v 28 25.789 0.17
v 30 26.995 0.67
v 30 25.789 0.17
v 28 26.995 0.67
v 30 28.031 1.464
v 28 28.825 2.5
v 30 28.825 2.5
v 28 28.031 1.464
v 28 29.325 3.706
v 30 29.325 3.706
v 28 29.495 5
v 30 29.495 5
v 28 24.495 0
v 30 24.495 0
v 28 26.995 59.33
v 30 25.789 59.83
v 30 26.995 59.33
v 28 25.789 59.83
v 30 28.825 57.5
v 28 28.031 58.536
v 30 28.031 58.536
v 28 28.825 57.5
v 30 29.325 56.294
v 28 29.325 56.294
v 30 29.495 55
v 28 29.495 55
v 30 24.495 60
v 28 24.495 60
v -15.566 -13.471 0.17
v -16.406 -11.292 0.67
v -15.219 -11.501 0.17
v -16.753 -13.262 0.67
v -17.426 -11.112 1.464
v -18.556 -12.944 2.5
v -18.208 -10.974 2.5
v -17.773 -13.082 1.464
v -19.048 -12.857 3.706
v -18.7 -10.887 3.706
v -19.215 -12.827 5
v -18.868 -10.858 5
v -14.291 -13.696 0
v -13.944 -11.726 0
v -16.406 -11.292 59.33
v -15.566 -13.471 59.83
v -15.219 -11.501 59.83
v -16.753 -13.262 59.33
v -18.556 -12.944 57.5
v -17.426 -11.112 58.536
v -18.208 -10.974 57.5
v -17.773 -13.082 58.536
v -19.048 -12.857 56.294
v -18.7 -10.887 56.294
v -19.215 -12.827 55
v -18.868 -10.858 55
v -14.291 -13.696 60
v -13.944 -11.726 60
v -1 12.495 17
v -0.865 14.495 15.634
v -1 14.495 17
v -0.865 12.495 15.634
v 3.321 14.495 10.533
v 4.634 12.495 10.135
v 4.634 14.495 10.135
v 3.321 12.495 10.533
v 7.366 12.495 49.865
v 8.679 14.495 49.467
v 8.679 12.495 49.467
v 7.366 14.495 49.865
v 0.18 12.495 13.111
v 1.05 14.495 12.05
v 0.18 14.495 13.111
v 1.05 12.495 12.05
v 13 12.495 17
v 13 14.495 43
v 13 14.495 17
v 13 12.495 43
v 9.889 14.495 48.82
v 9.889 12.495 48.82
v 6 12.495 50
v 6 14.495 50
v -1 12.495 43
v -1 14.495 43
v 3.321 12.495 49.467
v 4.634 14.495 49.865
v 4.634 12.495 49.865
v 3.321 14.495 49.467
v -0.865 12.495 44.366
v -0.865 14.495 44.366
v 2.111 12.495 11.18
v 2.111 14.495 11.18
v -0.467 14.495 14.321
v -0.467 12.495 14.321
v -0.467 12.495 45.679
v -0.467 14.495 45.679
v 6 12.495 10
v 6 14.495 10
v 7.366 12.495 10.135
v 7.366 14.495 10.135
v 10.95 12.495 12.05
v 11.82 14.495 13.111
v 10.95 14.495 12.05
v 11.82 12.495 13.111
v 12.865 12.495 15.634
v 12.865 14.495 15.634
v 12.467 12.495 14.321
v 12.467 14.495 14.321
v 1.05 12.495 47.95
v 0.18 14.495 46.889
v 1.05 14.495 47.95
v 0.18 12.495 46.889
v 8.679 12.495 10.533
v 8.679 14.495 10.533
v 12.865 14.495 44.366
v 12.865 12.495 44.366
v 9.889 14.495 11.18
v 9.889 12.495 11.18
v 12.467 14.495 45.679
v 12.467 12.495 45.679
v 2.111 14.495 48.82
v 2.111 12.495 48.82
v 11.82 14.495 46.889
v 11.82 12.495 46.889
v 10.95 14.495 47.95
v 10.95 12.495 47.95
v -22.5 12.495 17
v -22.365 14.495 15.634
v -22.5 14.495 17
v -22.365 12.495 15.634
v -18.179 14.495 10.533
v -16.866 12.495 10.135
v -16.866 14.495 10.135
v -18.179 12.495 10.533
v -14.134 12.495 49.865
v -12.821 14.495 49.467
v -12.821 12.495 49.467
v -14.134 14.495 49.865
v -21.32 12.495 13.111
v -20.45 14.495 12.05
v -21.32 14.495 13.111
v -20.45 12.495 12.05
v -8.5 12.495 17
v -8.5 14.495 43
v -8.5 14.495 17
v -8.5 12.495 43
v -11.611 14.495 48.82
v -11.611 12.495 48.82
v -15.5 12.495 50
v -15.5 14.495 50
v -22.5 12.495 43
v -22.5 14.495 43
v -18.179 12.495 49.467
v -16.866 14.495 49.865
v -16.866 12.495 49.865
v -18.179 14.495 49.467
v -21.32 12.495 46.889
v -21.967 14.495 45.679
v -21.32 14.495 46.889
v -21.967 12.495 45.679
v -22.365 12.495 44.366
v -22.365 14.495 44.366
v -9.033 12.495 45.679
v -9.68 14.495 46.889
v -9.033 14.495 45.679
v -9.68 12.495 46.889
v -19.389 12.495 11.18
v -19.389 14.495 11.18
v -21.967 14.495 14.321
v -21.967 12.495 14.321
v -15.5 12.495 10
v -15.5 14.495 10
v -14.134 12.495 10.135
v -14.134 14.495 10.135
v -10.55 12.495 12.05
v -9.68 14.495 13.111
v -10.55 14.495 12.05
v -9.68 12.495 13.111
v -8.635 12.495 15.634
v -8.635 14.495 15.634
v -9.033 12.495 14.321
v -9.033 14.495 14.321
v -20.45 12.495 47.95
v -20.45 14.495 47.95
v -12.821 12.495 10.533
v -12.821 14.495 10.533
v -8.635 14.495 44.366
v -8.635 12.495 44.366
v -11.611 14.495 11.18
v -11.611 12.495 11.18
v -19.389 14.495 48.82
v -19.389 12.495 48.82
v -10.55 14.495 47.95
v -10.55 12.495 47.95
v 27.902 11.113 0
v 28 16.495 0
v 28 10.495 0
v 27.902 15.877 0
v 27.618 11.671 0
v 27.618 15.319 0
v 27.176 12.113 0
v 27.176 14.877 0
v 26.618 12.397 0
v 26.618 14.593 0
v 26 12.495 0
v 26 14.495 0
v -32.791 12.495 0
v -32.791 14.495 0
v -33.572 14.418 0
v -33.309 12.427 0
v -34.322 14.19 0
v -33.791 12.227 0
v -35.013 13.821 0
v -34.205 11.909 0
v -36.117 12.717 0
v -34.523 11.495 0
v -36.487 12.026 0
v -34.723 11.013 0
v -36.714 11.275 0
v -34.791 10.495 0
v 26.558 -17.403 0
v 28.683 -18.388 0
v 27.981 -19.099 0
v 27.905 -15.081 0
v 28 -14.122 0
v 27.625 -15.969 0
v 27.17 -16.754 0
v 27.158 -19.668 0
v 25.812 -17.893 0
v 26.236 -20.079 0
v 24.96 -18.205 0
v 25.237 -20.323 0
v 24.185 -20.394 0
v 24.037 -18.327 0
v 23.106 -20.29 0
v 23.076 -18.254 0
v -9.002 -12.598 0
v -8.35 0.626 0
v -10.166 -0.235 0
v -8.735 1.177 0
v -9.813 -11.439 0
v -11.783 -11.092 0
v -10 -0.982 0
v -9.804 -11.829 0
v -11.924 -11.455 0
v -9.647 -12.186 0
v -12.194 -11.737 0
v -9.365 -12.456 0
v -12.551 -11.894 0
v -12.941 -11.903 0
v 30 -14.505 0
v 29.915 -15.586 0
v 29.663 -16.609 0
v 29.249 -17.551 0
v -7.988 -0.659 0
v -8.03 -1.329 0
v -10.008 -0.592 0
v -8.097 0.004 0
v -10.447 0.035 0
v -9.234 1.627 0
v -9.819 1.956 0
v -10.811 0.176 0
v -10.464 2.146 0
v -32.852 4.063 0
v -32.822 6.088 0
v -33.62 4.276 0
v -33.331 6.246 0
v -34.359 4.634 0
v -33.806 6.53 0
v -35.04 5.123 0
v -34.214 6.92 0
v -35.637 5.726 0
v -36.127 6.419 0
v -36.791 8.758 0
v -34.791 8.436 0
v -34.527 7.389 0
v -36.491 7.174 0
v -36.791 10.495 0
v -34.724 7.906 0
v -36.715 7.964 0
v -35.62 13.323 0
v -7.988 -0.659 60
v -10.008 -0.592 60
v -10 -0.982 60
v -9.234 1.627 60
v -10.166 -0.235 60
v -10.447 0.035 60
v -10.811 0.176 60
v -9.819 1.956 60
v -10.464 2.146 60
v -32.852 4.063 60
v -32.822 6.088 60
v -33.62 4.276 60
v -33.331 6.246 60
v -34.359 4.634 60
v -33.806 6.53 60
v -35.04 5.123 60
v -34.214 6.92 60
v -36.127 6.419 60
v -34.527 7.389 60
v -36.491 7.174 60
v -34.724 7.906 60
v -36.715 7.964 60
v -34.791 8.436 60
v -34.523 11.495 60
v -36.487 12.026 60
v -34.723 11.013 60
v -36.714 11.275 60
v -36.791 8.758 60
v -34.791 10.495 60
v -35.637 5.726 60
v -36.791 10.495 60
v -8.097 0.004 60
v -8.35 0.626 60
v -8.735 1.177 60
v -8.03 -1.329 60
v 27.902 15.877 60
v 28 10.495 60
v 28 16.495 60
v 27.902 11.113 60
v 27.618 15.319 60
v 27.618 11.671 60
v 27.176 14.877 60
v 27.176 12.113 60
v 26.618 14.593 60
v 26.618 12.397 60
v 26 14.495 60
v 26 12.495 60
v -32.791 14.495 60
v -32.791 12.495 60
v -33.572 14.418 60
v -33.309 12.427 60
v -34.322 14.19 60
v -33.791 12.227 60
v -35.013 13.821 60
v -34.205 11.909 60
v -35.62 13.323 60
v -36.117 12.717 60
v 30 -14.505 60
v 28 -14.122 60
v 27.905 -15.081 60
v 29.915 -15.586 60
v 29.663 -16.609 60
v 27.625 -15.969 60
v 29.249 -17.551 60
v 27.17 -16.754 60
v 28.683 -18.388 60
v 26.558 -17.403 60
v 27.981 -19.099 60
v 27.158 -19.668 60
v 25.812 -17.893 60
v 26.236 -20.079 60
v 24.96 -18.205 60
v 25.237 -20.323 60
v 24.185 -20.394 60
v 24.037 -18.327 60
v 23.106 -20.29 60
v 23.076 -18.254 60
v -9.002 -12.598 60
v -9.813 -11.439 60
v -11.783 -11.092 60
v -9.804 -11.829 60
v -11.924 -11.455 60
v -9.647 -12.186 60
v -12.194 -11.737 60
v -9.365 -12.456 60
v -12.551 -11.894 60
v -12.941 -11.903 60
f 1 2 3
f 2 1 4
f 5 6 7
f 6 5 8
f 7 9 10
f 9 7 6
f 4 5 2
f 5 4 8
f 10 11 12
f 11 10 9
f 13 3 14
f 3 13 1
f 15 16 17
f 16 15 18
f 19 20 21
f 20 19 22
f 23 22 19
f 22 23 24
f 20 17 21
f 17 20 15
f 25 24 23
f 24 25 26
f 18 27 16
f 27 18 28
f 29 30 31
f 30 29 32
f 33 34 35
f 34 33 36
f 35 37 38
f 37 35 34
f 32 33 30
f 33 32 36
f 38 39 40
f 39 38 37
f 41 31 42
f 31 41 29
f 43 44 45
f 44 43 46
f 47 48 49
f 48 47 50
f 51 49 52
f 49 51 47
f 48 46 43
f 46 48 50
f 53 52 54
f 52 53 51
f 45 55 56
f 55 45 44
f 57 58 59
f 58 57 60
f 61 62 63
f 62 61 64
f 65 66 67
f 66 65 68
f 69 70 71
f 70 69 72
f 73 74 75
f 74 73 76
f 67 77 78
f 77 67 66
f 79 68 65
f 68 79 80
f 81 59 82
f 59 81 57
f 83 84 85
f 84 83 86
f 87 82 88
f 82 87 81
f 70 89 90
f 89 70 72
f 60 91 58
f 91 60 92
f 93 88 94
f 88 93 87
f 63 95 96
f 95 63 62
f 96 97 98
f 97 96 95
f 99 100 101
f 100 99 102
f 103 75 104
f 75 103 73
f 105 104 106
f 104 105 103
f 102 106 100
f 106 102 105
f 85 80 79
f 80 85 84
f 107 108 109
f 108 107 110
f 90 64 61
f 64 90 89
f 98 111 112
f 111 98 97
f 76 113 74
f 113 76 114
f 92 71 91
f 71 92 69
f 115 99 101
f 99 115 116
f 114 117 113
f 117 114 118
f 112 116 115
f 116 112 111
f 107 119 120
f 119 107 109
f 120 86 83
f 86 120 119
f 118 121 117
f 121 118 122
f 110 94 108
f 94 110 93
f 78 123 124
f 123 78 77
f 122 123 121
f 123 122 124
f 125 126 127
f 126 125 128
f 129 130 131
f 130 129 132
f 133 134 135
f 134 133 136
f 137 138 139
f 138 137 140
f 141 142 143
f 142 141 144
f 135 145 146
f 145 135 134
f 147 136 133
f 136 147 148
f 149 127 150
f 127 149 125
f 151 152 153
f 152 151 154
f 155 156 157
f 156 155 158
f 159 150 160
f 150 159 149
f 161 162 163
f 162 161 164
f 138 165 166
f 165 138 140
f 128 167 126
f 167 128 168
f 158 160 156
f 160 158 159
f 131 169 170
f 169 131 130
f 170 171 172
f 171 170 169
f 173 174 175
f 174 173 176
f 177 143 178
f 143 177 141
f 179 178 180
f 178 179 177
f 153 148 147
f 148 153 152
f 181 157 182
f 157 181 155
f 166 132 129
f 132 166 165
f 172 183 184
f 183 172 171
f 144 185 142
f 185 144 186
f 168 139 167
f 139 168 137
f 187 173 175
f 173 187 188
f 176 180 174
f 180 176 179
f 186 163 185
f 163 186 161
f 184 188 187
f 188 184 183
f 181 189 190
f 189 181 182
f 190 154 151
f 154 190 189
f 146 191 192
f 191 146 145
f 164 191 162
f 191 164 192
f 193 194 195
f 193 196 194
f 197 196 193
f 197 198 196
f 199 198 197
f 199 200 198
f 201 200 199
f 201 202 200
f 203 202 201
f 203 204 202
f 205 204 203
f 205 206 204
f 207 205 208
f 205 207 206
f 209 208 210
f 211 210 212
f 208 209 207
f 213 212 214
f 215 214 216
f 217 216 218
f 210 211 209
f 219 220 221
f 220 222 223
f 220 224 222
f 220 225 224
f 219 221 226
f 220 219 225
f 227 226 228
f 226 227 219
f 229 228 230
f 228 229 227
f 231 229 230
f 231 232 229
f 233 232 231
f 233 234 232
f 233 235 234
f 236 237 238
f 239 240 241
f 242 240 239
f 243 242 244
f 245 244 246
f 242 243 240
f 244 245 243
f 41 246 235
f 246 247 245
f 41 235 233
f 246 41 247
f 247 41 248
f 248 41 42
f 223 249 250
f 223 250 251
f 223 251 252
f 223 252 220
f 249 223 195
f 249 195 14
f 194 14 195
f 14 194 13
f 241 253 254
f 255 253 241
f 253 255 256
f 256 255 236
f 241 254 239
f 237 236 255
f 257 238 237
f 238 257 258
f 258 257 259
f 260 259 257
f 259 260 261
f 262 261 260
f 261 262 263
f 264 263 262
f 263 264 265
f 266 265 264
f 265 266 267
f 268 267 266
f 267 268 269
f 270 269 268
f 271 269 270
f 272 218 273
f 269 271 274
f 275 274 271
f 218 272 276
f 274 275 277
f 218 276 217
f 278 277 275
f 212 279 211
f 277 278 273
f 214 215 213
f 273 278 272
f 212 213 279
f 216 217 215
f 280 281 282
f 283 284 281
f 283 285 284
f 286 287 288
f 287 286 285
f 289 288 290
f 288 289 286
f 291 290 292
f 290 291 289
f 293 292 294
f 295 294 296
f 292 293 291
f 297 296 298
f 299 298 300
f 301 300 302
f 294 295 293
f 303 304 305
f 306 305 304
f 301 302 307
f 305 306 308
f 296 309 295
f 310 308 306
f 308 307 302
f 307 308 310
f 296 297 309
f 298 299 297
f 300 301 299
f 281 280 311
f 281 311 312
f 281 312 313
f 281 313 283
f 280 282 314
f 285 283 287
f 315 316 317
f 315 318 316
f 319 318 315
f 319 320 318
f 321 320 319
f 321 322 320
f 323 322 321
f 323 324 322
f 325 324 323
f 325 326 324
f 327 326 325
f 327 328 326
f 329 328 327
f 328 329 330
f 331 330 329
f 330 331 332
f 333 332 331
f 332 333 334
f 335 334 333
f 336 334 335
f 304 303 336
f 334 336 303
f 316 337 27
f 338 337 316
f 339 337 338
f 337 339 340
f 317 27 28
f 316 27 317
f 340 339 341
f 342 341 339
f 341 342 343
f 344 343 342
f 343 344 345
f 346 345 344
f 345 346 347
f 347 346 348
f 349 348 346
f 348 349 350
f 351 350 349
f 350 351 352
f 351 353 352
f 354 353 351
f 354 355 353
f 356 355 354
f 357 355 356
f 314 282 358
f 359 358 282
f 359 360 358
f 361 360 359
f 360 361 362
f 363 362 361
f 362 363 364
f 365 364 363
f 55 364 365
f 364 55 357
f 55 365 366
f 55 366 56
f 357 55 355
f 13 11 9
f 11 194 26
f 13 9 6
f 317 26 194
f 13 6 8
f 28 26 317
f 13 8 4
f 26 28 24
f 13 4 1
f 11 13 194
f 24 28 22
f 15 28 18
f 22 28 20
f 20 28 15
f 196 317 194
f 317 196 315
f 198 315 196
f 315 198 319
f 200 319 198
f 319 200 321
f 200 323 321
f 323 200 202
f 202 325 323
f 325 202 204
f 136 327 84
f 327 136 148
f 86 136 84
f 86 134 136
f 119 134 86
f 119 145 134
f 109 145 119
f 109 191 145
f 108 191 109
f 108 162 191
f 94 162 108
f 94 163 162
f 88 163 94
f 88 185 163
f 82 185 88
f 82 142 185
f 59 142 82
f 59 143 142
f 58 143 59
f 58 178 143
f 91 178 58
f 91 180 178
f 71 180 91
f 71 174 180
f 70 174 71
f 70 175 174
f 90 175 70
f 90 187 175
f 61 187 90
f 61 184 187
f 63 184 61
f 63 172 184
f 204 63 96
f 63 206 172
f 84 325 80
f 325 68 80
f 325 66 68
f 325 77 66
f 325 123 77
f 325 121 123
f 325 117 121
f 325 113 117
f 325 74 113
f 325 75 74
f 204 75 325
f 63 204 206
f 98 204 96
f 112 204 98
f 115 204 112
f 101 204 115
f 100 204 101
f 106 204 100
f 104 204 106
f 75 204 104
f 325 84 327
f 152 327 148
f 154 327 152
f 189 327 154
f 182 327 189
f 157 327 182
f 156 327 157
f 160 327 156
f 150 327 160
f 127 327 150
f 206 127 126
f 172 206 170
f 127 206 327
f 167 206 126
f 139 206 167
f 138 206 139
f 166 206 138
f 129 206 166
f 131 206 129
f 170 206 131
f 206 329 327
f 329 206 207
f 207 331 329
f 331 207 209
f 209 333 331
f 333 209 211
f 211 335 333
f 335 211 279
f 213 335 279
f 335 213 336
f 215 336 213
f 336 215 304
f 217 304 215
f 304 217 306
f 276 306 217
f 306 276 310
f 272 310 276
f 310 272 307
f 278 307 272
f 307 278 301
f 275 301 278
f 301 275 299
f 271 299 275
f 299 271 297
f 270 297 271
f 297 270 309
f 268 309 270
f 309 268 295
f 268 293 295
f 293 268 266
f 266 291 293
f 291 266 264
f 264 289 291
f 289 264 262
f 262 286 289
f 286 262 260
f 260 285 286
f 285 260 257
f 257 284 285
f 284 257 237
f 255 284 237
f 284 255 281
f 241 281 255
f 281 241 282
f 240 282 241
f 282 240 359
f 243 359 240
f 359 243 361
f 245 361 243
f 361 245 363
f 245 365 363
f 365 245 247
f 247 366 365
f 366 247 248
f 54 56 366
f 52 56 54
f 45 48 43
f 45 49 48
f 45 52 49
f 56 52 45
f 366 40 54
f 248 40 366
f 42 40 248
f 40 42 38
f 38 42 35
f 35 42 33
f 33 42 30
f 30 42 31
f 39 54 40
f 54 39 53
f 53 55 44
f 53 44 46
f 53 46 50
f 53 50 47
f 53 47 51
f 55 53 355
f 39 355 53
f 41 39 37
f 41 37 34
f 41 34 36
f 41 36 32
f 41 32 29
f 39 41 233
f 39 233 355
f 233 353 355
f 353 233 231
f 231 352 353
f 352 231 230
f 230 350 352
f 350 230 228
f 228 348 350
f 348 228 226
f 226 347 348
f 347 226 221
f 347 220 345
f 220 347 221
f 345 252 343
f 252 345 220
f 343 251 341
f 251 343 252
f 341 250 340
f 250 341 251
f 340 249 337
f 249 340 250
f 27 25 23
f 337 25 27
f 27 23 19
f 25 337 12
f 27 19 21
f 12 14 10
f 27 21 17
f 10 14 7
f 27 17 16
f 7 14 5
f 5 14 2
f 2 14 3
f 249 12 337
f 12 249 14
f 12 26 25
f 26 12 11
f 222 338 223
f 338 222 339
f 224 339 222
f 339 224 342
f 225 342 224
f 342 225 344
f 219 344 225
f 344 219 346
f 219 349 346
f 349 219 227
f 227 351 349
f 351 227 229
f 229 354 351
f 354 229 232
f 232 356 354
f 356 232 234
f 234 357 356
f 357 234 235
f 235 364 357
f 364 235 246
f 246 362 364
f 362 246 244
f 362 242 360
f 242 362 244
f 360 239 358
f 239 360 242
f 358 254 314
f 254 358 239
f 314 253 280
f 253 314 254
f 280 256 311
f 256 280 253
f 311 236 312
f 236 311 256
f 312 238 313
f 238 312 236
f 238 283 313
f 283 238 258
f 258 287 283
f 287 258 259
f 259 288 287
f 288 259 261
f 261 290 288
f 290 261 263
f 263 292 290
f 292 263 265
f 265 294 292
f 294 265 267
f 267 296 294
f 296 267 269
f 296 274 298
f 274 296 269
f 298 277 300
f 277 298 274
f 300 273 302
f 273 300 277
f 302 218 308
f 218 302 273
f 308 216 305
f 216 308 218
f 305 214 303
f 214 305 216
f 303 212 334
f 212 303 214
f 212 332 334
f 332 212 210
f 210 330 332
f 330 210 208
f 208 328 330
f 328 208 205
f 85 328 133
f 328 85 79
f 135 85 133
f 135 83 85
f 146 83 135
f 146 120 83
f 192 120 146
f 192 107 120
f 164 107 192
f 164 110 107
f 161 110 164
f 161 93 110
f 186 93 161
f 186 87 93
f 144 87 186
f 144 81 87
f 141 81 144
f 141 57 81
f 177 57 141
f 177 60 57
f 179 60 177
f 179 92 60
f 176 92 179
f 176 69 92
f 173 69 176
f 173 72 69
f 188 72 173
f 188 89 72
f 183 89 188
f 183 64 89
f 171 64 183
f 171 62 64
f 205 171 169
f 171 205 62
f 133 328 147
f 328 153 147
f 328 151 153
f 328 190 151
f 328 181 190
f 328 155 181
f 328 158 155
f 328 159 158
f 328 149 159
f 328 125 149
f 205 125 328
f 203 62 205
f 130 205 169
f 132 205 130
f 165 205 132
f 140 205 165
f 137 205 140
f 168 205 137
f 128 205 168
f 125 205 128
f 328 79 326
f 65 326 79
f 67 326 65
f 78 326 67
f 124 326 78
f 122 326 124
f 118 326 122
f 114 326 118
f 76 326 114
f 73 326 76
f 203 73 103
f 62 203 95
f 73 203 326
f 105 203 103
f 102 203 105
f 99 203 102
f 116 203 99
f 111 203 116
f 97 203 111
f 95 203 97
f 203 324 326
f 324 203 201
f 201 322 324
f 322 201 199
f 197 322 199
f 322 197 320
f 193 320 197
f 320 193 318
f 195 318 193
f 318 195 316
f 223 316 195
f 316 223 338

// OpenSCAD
// Smartphone Stand by DrLex, 2018/04 - 2024/11
// Released under Creative Commons - Attribution license
// Version 2.1

// Thickness of your phone. Depending on the shape, you may need to add some extra margin.
thick = 12.0; //[3.0:0.1:25.0]
// How high to raise the phone from the surface. This should be high enough if you want to be able to plug in a USB cable.
lift = 40; //[10.0:0.5:60.0]
// Width of the holder.
width = 60.0; //[5:0.5:120.0]
// Length of the lip at the rear.
rearLip = 15; //[5:0.5:60]
// Enable slots in the rear (to reduce material, route cables, or just for the looks). Only if width is at least 34.
rearSlots = "yes"; //[yes,no]
// Omit the rear lip entirely to allow mounting to a wall.
wallMount = "no"; //[yes,no]
// Create a hole for a USB cable. Cannot be used if thick < 9.
usbHole = "no"; //[yes,no]
// Create a cable hole in the bottom front.
frontHole = "no"; //[yes,no]
// Create a cable hole in the bottom rear.
rearHole = "no"; //[yes,no]
// Create a gap in the front for easier cable routing (overrides frontHole and usbHole, requires thick >= 9).
frontGap = "no"; //[yes,no]
// Include a support with frontGap that will likely be much more efficient than auto-generated supports. It must be broken away after printing; some sanding may be needed for a nice result.
frontGapSupport = "yes"; //[yes,no]

// Enable this and set width to 5 to print a quick test slice to see whether your phone fits well. (Rounded corners and holes will be omitted.)
testPiece = "no"; //[yes,no]

// Show the model in its normal use orientation without any built-in supports. On an FDM printer you probably shouldn't try to print it like this.
preview = "no"; //[yes,no]

/* [Advanced] */
// When using frontGap, leave this much of a gap between the built-in support and the actual object.
suppGap = 0.2; //[0.1:0.01:0.5]

// Connect the support at the bottom with small blocks. Makes it harder to remove and may require some clean-up, but reduces risk of the print being ruined by the support breaking loose.
anchorSupport = "no"; //[yes,no]


/* [Hidden] */
// Unlike the OpenSCAD customizer, the Thingiverse customizer does not support simple checkboxes, hence this kludge.
bPreview   = (preview == "yes");
bRearSlots = (rearSlots == "yes");
bWallMount = (wallMount == "yes");
bUsbHole   = (usbHole == "yes" || frontGap == "yes") && thick >= 8.8;
bFrontHole = (frontHole == "yes");
bRearHole  = (rearHole == "yes");
bFrontGap  = (frontGap == "yes" && thick >= 8.8 && width >= 18);
bFrontGapS = (frontGapSupport == "yes" || bPreview);
bAnchor    = (anchorSupport == "yes" && bFrontGap && bFrontGapS);
bTestPiece = (testPiece == "yes");

rear = rearLip + 14.495;
ox = thick * cos(10);
ox2 = ox + (thick * sin(10) + lift - 38.2967) * tan(10);
lift2 = lift + thick * sin(10);

rearSlot1 = lift < 30 || lift >= 53 ? lift/2 + 14 : lift/2 + 4;
rearSlot2 = lift >= 30 ? rearSlot1 + 21.5 : 0.0;
rearSlot3 = lift >= 53 ? rearSlot1 - 21.5 : 0.0;

rotation = bPreview ? [90, 0, 90] : [0, 0, 90];
shift = bPreview ? [-width/2, 0, 0] : [lift/2 + 10, 0, 0];

translate(shift) rotate(rotation) {
  difference() {
    linear_extrude(width, convexity=10) extrusionProfile();

    if(! bTestPiece) {
        translate([rear, 0, 0]) rotate([90, 0, 0]) cornerCutter();
        translate([rear, 0, width]) rotate([-90, 0, 0]) cornerCutter();
        translate([-1.00976 - ox, 7.13165 + lift2, 0]) rotate([90, 0, 80]) cornerCutter();
        translate([-1.00976 - ox, 7.13165 + lift2, width]) rotate([-90, 0, 80]) cornerCutter();

        if(bRearSlots && width >= 34) {
            translate([13.495, rearSlot1, width/2]) rotate([0, 90, 0]) stretchCylinder(7, width - 20, 5);
            if(rearSlot2 > 0)
                translate([13.495, rearSlot2, width/2]) rotate([0, 90, 0]) stretchCylinder(7, width - 20, 5);
            if(rearSlot3 > 0)
                translate([13.495, rearSlot3, width/2]) rotate([0, 90, 0]) stretchCylinder(7, width - 20, 5);
        }

        if(bUsbHole && thick >= 8.8 && width >= 24) {
            translate([(-0.982058 + 0.725908 - ox)/2, (lift - 0.30121 + lift2)/2, width/2]) rotate([100,90,0]) smoothCube(18.8, 9, 5, 1.5);
        }

        // Extra fanciness has been added to reduce the need for supports. You still need good cooling and print at thin layers to avoid making a mess, though. Or, simply cut away the mess after printing.
        if(bFrontGap) {
            translate([-ox2, 0, width/2]) {
                difference() {
                    translate([-9, -0.49, 0]) rotate([90, 0, 0]) stretchCylinder(7.4, 30, 5);
                    translate([-28, -4, -8]) cube([25, 7, 16]);
                }
                if(bPreview || ! bFrontGapS) {
                    // Remove the whole thing
                    translate([-10, -2, -7.4]) rotate([0,0,-10]) cube([7.6, lift+20, 14.8]);
                    translate([0, lift-2, -7.4]) rotate([0,0,-10]) cube([thick/2, 20, 14.8]);
                }
                else {
                    // Surgically remove only what needs to become a gap
                    translate([-10, -2, 7.4-suppGap]) rotate([0,0,-10]) cube([7.6, lift+20, suppGap]);
                    translate([0, lift-2, 7.4-suppGap]) rotate([0,0,-10]) cube([thick/2, 20, suppGap]);
                    translate([-10, -2, -7.4]) rotate([0,0,-10]) cube([7.6, lift+20, suppGap]);
                    translate([0, lift-2, -7.4]) rotate([0,0,-10]) cube([thick/2, 20, suppGap]);
                    // Do not waste material in support, thinner also makes it easier to remove
                    translate([-9.5, 0, 0]) rotate([90,0,-9.95]) translate([0, 0, -lift/2-7]) smoothCube(3, 12, lift+20);
                }
                translate([-2.5, 0, 0]) cube([2.0, 10, 14.8], center=true);
            }
        }
        else if(bFrontHole) {
            translate([-ox2, 0, width/2]) {
                translate([-9, -0.49, 0]) rotate([90, 0, 0]) stretchCylinder(7.4, 30, 5);
                translate([-10, 0, 0]) rotate([90, 0, 90]) stretchCylinder(7, 21, 17);
                translate([-3.3, 0, 0]) cube([3.6, 10, 14.8], center=true);
            }
        }

        if(bRearHole) {
            translate([13.495, 0, width/2]) rotate([90, 0, 0]) stretchCylinder(7.4, 22, 5);
            translate([13.495, 0, width/2]) rotate([90, 0, 90]) difference() {
                stretchCylinder(7.8, 22, 6);
                translate([-7.95, 0, 0]) cube(20, center=true);
            }
        }

//        if(bFrontHole) {
//            translate([-ox - 10, 1, width/2]) rotate([90, 0, 0]) stretchSphere(7, 30, 5);
//        }
//        
//        if(bRearHole) {
//             translate([13.495, 1, width/2]) rotate([90, 0, 0]) stretchSphere(7, 22, 5);
//        }

        if(bWallMount) {
            translate([14.495, -5, -5]) cube([rearLip+1, 12, width+10]);
        }
    }
  }

  if(bAnchor && ! (bTestPiece || bPreview)) {
      translate([-ox2, 0, width/2]) rotate([0,0,-9.95]) {
          translate([-7.8, lift+6.5, -7.2]) cube([1.2, 2.4, 1], center=true);
          translate([-5.3, 1.2, -7.2]) rotate([0,0,68]) cube([1.2, 2.4, 1], center=true);
      }
  }
}


module cornerCutter() {
    difference() {
        cube([10, 10, 5], center=true);
        translate([-5, 5, 0]) cylinder(r=5, h=6, $fn=24, center=true);
    }
}

module smoothCube(w, d, ht, rad=1) {
    minkowski() {
        cube([w-2*rad, d-2*rad, ht-1], center=true);
        cylinder(r=rad, h=1, $fn=20);
    }
}

module stretchCylinder(r, l, h) {
    hull() {
        translate([-l/2+r, 0, 0]) cylinder(r=r, h=h, center=true, $fn=32);
        translate([l/2-r, 0, 0]) cylinder(r=r, h=h, center=true, $fn=32);
    }
}

module stretchSphere(r, l, h) {
    hull() {
        translate([-l/2+r, 0, h/2]) sphere(r=r, center=true, $fn=32);
        translate([l/2-r, 0, h/2]) sphere(r=r, center=true, $fn=32);        
        translate([-l/2+r, 0, -h/2]) sphere(r=r, center=true, $fn=32);
        translate([l/2-r, 0, -h/2]) sphere(r=r, center=true, $fn=32);        
    }
}

// These coordinates were extracted from a prototype model created in Blender.
// In retrospect I might have used a single line instead, and add thickness to it with offset(). However, I'm not sure how easy it would be to add the various rounded corners.
module extrusionProfile() {
    polygon(points = [
        [rear, 0], // rear T-joint outer (0)
        [rear, 2],
        [16.495, 2],
        [15.877, 2.09789],
        [15.3195, 2.38197],
        [14.877, 2.82443],
        [14.5929, 3.38197],
        [14.495, 4],
        [12.495, 4], // rear T-joint inner (8)
        [12.3971, 3.38197],
        [12.1131, 2.82443],
        [11.6706, 2.38197],
        [11.1131, 2.09789],
        [10.495, 2],
        [14.495, 22.7912 + lift], // top arc outer (14)
        [14.4182, 23.5716 + lift],
        [14.1905, 24.322 + lift],
        [13.8209, 25.0135 + lift],
        [13.3234, 25.6196 + lift],
        [12.7173, 26.1171 + lift],
        [12.0258, 26.4867 + lift],
        [11.2754, 26.7144 + lift],
        [10.495, 26.7912 + lift],
        [8.758, 26.7912 + lift],
        [7.96429, 26.7155 + lift],
        [7.17439, 26.4914 + lift],
        [6.41864, 26.1273 + lift],
        [5.72611, 25.6374 + lift],
        [5.12338, 25.0405 + lift],
        [4.63365, 24.3595 + lift],
        [4.27570, 23.6205 + lift],
        [4.06332, 22.852 + lift],
        [6.08829, 22.8216 + lift], // top arc inner (32)
        [6.24633, 23.3314 + lift],
        [6.52989, 23.8064 + lift],
        [6.91965, 24.2143 + lift],
        [7.38906, 24.5273 + lift],
        [7.90612, 24.7241 + lift],
        [8.43559, 24.7912 + lift],
        [10.495, 24.7912 + lift],
        [11.0127, 24.7231 + lift],
        [11.495, 24.5233 + lift],
        [11.9092, 24.2054 + lift],
        [12.2271, 23.7912 + lift],
        [12.4269, 23.3089 + lift],
        [12.495, 22.7912 + lift],
        [0.176419, 0.811108 + lift], // cradle rear outer (46)
        [0.034995, 0.447456 + lift],
        [-0.234827, 0.165604 + lift],
        [-0.591969, 0.008461 + lift],
        [-0.982058, lift],
        [-1.32935, -1.96966 + lift], // cradle rear inner (51)
        [-0.658872, -2.01151 + lift],
        [0.0041122, -1.90311 + lift],
        [0.626352, -1.6499 + lift],
        [1.17665, -1.26458 + lift],
        [1.62741, -0.766468 + lift],
        [1.95602, -0.180542 + lift],
        [2.14601, 0.463818 + lift],
        [0.725908 - ox, -0.30121 + lift2], // cradle front (59)
        [0.362259 - ox, -0.159795 + lift2],
        [0.080406 - ox, 0.110022 + lift2],
        [-0.076738 - ox, 0.467158 + lift2],
        [-0.085251 - ox, 0.857245 + lift2],
        [0.959858 - ox, 6.78435 + lift2],
        [-1.00976 - ox, 7.13165 + lift2],
        [-0.779844 - ox, -3.08198 + lift2], // cradle T-joint inner (66)
        [-0.638426 - ox, -2.71833 + lift2],
        [-0.368612 - ox, -2.43648 + lift2],
        [-0.011475 - ox, -2.27934 + lift2],
        [0.378613 - ox, -2.27083 + lift2],
        [-7.80451 - ox2, 6.89365], // front outer (71)
        [-7.90847 - ox2, 5.81525],
        [-7.83752 - ox2, 4.7634],
        [-7.59339 - ox2, 3.764],
        [-7.1821 - ox2, 2.84167],
        [-6.61377 - ox2, 2.0191],
        [-5.90239 - ox2, 1.31657],
        [-5.06549 - ox2, 0.751364],
        [-4.12367 - ox2, 0.3374],
        [-3.10012 - ox2, 0.084871],
        [-2.02004 - ox2, 0],
        [-1.63654 - ox2, 2], // front inner (82)
        [-2.59531 - ox2, 2.09461],
        [-3.48387 - ox2, 2.37482],
        [-4.26807 - ox2, 2.82985],
        [-4.91777 - ox2, 3.44222],
        [-5.40802 - ox2, 4.18839],
        [-5.71996 - ox2, 5.03969],
        [-5.84161 - ox2, 5.96341],
        [-5.7683 - ox2, 6.92404] // (90)
    ], paths = [
        [0, 1, 2, 3, 4, 5, 6, 7, // rear T-joint outer
        14, 15, 16, 17, 18, 19, 20, 21, 22, 23, 24, 25, 26, 27, 28, 29, 30, 31, // top arc outer
        46, 47, 48, 49, 50, // cradle rear outer
        59, 60, 61, 62, 63, 64, 65, // cradle front
        71, 72, 73, 74, 75, 76, 77, 78, 79, 80, 81, // front outer
        0], // close outer loop
        [8, 9, 10, 11, 12, 13, // rear T-joint inner
        82, 83, 84, 85, 86, 87, 88, 89, 90, // front inner
        66, 67, 68, 69, 70, // cradle T-joint inner
        51, 52, 53, 54, 55, 56, 57, 58, // cradle rear inner
        32, 33, 34, 35, 36, 37, 38, 39, 40, 41, 42, 43, 44, 45, // top arc inner
        8]
        ]);
}
